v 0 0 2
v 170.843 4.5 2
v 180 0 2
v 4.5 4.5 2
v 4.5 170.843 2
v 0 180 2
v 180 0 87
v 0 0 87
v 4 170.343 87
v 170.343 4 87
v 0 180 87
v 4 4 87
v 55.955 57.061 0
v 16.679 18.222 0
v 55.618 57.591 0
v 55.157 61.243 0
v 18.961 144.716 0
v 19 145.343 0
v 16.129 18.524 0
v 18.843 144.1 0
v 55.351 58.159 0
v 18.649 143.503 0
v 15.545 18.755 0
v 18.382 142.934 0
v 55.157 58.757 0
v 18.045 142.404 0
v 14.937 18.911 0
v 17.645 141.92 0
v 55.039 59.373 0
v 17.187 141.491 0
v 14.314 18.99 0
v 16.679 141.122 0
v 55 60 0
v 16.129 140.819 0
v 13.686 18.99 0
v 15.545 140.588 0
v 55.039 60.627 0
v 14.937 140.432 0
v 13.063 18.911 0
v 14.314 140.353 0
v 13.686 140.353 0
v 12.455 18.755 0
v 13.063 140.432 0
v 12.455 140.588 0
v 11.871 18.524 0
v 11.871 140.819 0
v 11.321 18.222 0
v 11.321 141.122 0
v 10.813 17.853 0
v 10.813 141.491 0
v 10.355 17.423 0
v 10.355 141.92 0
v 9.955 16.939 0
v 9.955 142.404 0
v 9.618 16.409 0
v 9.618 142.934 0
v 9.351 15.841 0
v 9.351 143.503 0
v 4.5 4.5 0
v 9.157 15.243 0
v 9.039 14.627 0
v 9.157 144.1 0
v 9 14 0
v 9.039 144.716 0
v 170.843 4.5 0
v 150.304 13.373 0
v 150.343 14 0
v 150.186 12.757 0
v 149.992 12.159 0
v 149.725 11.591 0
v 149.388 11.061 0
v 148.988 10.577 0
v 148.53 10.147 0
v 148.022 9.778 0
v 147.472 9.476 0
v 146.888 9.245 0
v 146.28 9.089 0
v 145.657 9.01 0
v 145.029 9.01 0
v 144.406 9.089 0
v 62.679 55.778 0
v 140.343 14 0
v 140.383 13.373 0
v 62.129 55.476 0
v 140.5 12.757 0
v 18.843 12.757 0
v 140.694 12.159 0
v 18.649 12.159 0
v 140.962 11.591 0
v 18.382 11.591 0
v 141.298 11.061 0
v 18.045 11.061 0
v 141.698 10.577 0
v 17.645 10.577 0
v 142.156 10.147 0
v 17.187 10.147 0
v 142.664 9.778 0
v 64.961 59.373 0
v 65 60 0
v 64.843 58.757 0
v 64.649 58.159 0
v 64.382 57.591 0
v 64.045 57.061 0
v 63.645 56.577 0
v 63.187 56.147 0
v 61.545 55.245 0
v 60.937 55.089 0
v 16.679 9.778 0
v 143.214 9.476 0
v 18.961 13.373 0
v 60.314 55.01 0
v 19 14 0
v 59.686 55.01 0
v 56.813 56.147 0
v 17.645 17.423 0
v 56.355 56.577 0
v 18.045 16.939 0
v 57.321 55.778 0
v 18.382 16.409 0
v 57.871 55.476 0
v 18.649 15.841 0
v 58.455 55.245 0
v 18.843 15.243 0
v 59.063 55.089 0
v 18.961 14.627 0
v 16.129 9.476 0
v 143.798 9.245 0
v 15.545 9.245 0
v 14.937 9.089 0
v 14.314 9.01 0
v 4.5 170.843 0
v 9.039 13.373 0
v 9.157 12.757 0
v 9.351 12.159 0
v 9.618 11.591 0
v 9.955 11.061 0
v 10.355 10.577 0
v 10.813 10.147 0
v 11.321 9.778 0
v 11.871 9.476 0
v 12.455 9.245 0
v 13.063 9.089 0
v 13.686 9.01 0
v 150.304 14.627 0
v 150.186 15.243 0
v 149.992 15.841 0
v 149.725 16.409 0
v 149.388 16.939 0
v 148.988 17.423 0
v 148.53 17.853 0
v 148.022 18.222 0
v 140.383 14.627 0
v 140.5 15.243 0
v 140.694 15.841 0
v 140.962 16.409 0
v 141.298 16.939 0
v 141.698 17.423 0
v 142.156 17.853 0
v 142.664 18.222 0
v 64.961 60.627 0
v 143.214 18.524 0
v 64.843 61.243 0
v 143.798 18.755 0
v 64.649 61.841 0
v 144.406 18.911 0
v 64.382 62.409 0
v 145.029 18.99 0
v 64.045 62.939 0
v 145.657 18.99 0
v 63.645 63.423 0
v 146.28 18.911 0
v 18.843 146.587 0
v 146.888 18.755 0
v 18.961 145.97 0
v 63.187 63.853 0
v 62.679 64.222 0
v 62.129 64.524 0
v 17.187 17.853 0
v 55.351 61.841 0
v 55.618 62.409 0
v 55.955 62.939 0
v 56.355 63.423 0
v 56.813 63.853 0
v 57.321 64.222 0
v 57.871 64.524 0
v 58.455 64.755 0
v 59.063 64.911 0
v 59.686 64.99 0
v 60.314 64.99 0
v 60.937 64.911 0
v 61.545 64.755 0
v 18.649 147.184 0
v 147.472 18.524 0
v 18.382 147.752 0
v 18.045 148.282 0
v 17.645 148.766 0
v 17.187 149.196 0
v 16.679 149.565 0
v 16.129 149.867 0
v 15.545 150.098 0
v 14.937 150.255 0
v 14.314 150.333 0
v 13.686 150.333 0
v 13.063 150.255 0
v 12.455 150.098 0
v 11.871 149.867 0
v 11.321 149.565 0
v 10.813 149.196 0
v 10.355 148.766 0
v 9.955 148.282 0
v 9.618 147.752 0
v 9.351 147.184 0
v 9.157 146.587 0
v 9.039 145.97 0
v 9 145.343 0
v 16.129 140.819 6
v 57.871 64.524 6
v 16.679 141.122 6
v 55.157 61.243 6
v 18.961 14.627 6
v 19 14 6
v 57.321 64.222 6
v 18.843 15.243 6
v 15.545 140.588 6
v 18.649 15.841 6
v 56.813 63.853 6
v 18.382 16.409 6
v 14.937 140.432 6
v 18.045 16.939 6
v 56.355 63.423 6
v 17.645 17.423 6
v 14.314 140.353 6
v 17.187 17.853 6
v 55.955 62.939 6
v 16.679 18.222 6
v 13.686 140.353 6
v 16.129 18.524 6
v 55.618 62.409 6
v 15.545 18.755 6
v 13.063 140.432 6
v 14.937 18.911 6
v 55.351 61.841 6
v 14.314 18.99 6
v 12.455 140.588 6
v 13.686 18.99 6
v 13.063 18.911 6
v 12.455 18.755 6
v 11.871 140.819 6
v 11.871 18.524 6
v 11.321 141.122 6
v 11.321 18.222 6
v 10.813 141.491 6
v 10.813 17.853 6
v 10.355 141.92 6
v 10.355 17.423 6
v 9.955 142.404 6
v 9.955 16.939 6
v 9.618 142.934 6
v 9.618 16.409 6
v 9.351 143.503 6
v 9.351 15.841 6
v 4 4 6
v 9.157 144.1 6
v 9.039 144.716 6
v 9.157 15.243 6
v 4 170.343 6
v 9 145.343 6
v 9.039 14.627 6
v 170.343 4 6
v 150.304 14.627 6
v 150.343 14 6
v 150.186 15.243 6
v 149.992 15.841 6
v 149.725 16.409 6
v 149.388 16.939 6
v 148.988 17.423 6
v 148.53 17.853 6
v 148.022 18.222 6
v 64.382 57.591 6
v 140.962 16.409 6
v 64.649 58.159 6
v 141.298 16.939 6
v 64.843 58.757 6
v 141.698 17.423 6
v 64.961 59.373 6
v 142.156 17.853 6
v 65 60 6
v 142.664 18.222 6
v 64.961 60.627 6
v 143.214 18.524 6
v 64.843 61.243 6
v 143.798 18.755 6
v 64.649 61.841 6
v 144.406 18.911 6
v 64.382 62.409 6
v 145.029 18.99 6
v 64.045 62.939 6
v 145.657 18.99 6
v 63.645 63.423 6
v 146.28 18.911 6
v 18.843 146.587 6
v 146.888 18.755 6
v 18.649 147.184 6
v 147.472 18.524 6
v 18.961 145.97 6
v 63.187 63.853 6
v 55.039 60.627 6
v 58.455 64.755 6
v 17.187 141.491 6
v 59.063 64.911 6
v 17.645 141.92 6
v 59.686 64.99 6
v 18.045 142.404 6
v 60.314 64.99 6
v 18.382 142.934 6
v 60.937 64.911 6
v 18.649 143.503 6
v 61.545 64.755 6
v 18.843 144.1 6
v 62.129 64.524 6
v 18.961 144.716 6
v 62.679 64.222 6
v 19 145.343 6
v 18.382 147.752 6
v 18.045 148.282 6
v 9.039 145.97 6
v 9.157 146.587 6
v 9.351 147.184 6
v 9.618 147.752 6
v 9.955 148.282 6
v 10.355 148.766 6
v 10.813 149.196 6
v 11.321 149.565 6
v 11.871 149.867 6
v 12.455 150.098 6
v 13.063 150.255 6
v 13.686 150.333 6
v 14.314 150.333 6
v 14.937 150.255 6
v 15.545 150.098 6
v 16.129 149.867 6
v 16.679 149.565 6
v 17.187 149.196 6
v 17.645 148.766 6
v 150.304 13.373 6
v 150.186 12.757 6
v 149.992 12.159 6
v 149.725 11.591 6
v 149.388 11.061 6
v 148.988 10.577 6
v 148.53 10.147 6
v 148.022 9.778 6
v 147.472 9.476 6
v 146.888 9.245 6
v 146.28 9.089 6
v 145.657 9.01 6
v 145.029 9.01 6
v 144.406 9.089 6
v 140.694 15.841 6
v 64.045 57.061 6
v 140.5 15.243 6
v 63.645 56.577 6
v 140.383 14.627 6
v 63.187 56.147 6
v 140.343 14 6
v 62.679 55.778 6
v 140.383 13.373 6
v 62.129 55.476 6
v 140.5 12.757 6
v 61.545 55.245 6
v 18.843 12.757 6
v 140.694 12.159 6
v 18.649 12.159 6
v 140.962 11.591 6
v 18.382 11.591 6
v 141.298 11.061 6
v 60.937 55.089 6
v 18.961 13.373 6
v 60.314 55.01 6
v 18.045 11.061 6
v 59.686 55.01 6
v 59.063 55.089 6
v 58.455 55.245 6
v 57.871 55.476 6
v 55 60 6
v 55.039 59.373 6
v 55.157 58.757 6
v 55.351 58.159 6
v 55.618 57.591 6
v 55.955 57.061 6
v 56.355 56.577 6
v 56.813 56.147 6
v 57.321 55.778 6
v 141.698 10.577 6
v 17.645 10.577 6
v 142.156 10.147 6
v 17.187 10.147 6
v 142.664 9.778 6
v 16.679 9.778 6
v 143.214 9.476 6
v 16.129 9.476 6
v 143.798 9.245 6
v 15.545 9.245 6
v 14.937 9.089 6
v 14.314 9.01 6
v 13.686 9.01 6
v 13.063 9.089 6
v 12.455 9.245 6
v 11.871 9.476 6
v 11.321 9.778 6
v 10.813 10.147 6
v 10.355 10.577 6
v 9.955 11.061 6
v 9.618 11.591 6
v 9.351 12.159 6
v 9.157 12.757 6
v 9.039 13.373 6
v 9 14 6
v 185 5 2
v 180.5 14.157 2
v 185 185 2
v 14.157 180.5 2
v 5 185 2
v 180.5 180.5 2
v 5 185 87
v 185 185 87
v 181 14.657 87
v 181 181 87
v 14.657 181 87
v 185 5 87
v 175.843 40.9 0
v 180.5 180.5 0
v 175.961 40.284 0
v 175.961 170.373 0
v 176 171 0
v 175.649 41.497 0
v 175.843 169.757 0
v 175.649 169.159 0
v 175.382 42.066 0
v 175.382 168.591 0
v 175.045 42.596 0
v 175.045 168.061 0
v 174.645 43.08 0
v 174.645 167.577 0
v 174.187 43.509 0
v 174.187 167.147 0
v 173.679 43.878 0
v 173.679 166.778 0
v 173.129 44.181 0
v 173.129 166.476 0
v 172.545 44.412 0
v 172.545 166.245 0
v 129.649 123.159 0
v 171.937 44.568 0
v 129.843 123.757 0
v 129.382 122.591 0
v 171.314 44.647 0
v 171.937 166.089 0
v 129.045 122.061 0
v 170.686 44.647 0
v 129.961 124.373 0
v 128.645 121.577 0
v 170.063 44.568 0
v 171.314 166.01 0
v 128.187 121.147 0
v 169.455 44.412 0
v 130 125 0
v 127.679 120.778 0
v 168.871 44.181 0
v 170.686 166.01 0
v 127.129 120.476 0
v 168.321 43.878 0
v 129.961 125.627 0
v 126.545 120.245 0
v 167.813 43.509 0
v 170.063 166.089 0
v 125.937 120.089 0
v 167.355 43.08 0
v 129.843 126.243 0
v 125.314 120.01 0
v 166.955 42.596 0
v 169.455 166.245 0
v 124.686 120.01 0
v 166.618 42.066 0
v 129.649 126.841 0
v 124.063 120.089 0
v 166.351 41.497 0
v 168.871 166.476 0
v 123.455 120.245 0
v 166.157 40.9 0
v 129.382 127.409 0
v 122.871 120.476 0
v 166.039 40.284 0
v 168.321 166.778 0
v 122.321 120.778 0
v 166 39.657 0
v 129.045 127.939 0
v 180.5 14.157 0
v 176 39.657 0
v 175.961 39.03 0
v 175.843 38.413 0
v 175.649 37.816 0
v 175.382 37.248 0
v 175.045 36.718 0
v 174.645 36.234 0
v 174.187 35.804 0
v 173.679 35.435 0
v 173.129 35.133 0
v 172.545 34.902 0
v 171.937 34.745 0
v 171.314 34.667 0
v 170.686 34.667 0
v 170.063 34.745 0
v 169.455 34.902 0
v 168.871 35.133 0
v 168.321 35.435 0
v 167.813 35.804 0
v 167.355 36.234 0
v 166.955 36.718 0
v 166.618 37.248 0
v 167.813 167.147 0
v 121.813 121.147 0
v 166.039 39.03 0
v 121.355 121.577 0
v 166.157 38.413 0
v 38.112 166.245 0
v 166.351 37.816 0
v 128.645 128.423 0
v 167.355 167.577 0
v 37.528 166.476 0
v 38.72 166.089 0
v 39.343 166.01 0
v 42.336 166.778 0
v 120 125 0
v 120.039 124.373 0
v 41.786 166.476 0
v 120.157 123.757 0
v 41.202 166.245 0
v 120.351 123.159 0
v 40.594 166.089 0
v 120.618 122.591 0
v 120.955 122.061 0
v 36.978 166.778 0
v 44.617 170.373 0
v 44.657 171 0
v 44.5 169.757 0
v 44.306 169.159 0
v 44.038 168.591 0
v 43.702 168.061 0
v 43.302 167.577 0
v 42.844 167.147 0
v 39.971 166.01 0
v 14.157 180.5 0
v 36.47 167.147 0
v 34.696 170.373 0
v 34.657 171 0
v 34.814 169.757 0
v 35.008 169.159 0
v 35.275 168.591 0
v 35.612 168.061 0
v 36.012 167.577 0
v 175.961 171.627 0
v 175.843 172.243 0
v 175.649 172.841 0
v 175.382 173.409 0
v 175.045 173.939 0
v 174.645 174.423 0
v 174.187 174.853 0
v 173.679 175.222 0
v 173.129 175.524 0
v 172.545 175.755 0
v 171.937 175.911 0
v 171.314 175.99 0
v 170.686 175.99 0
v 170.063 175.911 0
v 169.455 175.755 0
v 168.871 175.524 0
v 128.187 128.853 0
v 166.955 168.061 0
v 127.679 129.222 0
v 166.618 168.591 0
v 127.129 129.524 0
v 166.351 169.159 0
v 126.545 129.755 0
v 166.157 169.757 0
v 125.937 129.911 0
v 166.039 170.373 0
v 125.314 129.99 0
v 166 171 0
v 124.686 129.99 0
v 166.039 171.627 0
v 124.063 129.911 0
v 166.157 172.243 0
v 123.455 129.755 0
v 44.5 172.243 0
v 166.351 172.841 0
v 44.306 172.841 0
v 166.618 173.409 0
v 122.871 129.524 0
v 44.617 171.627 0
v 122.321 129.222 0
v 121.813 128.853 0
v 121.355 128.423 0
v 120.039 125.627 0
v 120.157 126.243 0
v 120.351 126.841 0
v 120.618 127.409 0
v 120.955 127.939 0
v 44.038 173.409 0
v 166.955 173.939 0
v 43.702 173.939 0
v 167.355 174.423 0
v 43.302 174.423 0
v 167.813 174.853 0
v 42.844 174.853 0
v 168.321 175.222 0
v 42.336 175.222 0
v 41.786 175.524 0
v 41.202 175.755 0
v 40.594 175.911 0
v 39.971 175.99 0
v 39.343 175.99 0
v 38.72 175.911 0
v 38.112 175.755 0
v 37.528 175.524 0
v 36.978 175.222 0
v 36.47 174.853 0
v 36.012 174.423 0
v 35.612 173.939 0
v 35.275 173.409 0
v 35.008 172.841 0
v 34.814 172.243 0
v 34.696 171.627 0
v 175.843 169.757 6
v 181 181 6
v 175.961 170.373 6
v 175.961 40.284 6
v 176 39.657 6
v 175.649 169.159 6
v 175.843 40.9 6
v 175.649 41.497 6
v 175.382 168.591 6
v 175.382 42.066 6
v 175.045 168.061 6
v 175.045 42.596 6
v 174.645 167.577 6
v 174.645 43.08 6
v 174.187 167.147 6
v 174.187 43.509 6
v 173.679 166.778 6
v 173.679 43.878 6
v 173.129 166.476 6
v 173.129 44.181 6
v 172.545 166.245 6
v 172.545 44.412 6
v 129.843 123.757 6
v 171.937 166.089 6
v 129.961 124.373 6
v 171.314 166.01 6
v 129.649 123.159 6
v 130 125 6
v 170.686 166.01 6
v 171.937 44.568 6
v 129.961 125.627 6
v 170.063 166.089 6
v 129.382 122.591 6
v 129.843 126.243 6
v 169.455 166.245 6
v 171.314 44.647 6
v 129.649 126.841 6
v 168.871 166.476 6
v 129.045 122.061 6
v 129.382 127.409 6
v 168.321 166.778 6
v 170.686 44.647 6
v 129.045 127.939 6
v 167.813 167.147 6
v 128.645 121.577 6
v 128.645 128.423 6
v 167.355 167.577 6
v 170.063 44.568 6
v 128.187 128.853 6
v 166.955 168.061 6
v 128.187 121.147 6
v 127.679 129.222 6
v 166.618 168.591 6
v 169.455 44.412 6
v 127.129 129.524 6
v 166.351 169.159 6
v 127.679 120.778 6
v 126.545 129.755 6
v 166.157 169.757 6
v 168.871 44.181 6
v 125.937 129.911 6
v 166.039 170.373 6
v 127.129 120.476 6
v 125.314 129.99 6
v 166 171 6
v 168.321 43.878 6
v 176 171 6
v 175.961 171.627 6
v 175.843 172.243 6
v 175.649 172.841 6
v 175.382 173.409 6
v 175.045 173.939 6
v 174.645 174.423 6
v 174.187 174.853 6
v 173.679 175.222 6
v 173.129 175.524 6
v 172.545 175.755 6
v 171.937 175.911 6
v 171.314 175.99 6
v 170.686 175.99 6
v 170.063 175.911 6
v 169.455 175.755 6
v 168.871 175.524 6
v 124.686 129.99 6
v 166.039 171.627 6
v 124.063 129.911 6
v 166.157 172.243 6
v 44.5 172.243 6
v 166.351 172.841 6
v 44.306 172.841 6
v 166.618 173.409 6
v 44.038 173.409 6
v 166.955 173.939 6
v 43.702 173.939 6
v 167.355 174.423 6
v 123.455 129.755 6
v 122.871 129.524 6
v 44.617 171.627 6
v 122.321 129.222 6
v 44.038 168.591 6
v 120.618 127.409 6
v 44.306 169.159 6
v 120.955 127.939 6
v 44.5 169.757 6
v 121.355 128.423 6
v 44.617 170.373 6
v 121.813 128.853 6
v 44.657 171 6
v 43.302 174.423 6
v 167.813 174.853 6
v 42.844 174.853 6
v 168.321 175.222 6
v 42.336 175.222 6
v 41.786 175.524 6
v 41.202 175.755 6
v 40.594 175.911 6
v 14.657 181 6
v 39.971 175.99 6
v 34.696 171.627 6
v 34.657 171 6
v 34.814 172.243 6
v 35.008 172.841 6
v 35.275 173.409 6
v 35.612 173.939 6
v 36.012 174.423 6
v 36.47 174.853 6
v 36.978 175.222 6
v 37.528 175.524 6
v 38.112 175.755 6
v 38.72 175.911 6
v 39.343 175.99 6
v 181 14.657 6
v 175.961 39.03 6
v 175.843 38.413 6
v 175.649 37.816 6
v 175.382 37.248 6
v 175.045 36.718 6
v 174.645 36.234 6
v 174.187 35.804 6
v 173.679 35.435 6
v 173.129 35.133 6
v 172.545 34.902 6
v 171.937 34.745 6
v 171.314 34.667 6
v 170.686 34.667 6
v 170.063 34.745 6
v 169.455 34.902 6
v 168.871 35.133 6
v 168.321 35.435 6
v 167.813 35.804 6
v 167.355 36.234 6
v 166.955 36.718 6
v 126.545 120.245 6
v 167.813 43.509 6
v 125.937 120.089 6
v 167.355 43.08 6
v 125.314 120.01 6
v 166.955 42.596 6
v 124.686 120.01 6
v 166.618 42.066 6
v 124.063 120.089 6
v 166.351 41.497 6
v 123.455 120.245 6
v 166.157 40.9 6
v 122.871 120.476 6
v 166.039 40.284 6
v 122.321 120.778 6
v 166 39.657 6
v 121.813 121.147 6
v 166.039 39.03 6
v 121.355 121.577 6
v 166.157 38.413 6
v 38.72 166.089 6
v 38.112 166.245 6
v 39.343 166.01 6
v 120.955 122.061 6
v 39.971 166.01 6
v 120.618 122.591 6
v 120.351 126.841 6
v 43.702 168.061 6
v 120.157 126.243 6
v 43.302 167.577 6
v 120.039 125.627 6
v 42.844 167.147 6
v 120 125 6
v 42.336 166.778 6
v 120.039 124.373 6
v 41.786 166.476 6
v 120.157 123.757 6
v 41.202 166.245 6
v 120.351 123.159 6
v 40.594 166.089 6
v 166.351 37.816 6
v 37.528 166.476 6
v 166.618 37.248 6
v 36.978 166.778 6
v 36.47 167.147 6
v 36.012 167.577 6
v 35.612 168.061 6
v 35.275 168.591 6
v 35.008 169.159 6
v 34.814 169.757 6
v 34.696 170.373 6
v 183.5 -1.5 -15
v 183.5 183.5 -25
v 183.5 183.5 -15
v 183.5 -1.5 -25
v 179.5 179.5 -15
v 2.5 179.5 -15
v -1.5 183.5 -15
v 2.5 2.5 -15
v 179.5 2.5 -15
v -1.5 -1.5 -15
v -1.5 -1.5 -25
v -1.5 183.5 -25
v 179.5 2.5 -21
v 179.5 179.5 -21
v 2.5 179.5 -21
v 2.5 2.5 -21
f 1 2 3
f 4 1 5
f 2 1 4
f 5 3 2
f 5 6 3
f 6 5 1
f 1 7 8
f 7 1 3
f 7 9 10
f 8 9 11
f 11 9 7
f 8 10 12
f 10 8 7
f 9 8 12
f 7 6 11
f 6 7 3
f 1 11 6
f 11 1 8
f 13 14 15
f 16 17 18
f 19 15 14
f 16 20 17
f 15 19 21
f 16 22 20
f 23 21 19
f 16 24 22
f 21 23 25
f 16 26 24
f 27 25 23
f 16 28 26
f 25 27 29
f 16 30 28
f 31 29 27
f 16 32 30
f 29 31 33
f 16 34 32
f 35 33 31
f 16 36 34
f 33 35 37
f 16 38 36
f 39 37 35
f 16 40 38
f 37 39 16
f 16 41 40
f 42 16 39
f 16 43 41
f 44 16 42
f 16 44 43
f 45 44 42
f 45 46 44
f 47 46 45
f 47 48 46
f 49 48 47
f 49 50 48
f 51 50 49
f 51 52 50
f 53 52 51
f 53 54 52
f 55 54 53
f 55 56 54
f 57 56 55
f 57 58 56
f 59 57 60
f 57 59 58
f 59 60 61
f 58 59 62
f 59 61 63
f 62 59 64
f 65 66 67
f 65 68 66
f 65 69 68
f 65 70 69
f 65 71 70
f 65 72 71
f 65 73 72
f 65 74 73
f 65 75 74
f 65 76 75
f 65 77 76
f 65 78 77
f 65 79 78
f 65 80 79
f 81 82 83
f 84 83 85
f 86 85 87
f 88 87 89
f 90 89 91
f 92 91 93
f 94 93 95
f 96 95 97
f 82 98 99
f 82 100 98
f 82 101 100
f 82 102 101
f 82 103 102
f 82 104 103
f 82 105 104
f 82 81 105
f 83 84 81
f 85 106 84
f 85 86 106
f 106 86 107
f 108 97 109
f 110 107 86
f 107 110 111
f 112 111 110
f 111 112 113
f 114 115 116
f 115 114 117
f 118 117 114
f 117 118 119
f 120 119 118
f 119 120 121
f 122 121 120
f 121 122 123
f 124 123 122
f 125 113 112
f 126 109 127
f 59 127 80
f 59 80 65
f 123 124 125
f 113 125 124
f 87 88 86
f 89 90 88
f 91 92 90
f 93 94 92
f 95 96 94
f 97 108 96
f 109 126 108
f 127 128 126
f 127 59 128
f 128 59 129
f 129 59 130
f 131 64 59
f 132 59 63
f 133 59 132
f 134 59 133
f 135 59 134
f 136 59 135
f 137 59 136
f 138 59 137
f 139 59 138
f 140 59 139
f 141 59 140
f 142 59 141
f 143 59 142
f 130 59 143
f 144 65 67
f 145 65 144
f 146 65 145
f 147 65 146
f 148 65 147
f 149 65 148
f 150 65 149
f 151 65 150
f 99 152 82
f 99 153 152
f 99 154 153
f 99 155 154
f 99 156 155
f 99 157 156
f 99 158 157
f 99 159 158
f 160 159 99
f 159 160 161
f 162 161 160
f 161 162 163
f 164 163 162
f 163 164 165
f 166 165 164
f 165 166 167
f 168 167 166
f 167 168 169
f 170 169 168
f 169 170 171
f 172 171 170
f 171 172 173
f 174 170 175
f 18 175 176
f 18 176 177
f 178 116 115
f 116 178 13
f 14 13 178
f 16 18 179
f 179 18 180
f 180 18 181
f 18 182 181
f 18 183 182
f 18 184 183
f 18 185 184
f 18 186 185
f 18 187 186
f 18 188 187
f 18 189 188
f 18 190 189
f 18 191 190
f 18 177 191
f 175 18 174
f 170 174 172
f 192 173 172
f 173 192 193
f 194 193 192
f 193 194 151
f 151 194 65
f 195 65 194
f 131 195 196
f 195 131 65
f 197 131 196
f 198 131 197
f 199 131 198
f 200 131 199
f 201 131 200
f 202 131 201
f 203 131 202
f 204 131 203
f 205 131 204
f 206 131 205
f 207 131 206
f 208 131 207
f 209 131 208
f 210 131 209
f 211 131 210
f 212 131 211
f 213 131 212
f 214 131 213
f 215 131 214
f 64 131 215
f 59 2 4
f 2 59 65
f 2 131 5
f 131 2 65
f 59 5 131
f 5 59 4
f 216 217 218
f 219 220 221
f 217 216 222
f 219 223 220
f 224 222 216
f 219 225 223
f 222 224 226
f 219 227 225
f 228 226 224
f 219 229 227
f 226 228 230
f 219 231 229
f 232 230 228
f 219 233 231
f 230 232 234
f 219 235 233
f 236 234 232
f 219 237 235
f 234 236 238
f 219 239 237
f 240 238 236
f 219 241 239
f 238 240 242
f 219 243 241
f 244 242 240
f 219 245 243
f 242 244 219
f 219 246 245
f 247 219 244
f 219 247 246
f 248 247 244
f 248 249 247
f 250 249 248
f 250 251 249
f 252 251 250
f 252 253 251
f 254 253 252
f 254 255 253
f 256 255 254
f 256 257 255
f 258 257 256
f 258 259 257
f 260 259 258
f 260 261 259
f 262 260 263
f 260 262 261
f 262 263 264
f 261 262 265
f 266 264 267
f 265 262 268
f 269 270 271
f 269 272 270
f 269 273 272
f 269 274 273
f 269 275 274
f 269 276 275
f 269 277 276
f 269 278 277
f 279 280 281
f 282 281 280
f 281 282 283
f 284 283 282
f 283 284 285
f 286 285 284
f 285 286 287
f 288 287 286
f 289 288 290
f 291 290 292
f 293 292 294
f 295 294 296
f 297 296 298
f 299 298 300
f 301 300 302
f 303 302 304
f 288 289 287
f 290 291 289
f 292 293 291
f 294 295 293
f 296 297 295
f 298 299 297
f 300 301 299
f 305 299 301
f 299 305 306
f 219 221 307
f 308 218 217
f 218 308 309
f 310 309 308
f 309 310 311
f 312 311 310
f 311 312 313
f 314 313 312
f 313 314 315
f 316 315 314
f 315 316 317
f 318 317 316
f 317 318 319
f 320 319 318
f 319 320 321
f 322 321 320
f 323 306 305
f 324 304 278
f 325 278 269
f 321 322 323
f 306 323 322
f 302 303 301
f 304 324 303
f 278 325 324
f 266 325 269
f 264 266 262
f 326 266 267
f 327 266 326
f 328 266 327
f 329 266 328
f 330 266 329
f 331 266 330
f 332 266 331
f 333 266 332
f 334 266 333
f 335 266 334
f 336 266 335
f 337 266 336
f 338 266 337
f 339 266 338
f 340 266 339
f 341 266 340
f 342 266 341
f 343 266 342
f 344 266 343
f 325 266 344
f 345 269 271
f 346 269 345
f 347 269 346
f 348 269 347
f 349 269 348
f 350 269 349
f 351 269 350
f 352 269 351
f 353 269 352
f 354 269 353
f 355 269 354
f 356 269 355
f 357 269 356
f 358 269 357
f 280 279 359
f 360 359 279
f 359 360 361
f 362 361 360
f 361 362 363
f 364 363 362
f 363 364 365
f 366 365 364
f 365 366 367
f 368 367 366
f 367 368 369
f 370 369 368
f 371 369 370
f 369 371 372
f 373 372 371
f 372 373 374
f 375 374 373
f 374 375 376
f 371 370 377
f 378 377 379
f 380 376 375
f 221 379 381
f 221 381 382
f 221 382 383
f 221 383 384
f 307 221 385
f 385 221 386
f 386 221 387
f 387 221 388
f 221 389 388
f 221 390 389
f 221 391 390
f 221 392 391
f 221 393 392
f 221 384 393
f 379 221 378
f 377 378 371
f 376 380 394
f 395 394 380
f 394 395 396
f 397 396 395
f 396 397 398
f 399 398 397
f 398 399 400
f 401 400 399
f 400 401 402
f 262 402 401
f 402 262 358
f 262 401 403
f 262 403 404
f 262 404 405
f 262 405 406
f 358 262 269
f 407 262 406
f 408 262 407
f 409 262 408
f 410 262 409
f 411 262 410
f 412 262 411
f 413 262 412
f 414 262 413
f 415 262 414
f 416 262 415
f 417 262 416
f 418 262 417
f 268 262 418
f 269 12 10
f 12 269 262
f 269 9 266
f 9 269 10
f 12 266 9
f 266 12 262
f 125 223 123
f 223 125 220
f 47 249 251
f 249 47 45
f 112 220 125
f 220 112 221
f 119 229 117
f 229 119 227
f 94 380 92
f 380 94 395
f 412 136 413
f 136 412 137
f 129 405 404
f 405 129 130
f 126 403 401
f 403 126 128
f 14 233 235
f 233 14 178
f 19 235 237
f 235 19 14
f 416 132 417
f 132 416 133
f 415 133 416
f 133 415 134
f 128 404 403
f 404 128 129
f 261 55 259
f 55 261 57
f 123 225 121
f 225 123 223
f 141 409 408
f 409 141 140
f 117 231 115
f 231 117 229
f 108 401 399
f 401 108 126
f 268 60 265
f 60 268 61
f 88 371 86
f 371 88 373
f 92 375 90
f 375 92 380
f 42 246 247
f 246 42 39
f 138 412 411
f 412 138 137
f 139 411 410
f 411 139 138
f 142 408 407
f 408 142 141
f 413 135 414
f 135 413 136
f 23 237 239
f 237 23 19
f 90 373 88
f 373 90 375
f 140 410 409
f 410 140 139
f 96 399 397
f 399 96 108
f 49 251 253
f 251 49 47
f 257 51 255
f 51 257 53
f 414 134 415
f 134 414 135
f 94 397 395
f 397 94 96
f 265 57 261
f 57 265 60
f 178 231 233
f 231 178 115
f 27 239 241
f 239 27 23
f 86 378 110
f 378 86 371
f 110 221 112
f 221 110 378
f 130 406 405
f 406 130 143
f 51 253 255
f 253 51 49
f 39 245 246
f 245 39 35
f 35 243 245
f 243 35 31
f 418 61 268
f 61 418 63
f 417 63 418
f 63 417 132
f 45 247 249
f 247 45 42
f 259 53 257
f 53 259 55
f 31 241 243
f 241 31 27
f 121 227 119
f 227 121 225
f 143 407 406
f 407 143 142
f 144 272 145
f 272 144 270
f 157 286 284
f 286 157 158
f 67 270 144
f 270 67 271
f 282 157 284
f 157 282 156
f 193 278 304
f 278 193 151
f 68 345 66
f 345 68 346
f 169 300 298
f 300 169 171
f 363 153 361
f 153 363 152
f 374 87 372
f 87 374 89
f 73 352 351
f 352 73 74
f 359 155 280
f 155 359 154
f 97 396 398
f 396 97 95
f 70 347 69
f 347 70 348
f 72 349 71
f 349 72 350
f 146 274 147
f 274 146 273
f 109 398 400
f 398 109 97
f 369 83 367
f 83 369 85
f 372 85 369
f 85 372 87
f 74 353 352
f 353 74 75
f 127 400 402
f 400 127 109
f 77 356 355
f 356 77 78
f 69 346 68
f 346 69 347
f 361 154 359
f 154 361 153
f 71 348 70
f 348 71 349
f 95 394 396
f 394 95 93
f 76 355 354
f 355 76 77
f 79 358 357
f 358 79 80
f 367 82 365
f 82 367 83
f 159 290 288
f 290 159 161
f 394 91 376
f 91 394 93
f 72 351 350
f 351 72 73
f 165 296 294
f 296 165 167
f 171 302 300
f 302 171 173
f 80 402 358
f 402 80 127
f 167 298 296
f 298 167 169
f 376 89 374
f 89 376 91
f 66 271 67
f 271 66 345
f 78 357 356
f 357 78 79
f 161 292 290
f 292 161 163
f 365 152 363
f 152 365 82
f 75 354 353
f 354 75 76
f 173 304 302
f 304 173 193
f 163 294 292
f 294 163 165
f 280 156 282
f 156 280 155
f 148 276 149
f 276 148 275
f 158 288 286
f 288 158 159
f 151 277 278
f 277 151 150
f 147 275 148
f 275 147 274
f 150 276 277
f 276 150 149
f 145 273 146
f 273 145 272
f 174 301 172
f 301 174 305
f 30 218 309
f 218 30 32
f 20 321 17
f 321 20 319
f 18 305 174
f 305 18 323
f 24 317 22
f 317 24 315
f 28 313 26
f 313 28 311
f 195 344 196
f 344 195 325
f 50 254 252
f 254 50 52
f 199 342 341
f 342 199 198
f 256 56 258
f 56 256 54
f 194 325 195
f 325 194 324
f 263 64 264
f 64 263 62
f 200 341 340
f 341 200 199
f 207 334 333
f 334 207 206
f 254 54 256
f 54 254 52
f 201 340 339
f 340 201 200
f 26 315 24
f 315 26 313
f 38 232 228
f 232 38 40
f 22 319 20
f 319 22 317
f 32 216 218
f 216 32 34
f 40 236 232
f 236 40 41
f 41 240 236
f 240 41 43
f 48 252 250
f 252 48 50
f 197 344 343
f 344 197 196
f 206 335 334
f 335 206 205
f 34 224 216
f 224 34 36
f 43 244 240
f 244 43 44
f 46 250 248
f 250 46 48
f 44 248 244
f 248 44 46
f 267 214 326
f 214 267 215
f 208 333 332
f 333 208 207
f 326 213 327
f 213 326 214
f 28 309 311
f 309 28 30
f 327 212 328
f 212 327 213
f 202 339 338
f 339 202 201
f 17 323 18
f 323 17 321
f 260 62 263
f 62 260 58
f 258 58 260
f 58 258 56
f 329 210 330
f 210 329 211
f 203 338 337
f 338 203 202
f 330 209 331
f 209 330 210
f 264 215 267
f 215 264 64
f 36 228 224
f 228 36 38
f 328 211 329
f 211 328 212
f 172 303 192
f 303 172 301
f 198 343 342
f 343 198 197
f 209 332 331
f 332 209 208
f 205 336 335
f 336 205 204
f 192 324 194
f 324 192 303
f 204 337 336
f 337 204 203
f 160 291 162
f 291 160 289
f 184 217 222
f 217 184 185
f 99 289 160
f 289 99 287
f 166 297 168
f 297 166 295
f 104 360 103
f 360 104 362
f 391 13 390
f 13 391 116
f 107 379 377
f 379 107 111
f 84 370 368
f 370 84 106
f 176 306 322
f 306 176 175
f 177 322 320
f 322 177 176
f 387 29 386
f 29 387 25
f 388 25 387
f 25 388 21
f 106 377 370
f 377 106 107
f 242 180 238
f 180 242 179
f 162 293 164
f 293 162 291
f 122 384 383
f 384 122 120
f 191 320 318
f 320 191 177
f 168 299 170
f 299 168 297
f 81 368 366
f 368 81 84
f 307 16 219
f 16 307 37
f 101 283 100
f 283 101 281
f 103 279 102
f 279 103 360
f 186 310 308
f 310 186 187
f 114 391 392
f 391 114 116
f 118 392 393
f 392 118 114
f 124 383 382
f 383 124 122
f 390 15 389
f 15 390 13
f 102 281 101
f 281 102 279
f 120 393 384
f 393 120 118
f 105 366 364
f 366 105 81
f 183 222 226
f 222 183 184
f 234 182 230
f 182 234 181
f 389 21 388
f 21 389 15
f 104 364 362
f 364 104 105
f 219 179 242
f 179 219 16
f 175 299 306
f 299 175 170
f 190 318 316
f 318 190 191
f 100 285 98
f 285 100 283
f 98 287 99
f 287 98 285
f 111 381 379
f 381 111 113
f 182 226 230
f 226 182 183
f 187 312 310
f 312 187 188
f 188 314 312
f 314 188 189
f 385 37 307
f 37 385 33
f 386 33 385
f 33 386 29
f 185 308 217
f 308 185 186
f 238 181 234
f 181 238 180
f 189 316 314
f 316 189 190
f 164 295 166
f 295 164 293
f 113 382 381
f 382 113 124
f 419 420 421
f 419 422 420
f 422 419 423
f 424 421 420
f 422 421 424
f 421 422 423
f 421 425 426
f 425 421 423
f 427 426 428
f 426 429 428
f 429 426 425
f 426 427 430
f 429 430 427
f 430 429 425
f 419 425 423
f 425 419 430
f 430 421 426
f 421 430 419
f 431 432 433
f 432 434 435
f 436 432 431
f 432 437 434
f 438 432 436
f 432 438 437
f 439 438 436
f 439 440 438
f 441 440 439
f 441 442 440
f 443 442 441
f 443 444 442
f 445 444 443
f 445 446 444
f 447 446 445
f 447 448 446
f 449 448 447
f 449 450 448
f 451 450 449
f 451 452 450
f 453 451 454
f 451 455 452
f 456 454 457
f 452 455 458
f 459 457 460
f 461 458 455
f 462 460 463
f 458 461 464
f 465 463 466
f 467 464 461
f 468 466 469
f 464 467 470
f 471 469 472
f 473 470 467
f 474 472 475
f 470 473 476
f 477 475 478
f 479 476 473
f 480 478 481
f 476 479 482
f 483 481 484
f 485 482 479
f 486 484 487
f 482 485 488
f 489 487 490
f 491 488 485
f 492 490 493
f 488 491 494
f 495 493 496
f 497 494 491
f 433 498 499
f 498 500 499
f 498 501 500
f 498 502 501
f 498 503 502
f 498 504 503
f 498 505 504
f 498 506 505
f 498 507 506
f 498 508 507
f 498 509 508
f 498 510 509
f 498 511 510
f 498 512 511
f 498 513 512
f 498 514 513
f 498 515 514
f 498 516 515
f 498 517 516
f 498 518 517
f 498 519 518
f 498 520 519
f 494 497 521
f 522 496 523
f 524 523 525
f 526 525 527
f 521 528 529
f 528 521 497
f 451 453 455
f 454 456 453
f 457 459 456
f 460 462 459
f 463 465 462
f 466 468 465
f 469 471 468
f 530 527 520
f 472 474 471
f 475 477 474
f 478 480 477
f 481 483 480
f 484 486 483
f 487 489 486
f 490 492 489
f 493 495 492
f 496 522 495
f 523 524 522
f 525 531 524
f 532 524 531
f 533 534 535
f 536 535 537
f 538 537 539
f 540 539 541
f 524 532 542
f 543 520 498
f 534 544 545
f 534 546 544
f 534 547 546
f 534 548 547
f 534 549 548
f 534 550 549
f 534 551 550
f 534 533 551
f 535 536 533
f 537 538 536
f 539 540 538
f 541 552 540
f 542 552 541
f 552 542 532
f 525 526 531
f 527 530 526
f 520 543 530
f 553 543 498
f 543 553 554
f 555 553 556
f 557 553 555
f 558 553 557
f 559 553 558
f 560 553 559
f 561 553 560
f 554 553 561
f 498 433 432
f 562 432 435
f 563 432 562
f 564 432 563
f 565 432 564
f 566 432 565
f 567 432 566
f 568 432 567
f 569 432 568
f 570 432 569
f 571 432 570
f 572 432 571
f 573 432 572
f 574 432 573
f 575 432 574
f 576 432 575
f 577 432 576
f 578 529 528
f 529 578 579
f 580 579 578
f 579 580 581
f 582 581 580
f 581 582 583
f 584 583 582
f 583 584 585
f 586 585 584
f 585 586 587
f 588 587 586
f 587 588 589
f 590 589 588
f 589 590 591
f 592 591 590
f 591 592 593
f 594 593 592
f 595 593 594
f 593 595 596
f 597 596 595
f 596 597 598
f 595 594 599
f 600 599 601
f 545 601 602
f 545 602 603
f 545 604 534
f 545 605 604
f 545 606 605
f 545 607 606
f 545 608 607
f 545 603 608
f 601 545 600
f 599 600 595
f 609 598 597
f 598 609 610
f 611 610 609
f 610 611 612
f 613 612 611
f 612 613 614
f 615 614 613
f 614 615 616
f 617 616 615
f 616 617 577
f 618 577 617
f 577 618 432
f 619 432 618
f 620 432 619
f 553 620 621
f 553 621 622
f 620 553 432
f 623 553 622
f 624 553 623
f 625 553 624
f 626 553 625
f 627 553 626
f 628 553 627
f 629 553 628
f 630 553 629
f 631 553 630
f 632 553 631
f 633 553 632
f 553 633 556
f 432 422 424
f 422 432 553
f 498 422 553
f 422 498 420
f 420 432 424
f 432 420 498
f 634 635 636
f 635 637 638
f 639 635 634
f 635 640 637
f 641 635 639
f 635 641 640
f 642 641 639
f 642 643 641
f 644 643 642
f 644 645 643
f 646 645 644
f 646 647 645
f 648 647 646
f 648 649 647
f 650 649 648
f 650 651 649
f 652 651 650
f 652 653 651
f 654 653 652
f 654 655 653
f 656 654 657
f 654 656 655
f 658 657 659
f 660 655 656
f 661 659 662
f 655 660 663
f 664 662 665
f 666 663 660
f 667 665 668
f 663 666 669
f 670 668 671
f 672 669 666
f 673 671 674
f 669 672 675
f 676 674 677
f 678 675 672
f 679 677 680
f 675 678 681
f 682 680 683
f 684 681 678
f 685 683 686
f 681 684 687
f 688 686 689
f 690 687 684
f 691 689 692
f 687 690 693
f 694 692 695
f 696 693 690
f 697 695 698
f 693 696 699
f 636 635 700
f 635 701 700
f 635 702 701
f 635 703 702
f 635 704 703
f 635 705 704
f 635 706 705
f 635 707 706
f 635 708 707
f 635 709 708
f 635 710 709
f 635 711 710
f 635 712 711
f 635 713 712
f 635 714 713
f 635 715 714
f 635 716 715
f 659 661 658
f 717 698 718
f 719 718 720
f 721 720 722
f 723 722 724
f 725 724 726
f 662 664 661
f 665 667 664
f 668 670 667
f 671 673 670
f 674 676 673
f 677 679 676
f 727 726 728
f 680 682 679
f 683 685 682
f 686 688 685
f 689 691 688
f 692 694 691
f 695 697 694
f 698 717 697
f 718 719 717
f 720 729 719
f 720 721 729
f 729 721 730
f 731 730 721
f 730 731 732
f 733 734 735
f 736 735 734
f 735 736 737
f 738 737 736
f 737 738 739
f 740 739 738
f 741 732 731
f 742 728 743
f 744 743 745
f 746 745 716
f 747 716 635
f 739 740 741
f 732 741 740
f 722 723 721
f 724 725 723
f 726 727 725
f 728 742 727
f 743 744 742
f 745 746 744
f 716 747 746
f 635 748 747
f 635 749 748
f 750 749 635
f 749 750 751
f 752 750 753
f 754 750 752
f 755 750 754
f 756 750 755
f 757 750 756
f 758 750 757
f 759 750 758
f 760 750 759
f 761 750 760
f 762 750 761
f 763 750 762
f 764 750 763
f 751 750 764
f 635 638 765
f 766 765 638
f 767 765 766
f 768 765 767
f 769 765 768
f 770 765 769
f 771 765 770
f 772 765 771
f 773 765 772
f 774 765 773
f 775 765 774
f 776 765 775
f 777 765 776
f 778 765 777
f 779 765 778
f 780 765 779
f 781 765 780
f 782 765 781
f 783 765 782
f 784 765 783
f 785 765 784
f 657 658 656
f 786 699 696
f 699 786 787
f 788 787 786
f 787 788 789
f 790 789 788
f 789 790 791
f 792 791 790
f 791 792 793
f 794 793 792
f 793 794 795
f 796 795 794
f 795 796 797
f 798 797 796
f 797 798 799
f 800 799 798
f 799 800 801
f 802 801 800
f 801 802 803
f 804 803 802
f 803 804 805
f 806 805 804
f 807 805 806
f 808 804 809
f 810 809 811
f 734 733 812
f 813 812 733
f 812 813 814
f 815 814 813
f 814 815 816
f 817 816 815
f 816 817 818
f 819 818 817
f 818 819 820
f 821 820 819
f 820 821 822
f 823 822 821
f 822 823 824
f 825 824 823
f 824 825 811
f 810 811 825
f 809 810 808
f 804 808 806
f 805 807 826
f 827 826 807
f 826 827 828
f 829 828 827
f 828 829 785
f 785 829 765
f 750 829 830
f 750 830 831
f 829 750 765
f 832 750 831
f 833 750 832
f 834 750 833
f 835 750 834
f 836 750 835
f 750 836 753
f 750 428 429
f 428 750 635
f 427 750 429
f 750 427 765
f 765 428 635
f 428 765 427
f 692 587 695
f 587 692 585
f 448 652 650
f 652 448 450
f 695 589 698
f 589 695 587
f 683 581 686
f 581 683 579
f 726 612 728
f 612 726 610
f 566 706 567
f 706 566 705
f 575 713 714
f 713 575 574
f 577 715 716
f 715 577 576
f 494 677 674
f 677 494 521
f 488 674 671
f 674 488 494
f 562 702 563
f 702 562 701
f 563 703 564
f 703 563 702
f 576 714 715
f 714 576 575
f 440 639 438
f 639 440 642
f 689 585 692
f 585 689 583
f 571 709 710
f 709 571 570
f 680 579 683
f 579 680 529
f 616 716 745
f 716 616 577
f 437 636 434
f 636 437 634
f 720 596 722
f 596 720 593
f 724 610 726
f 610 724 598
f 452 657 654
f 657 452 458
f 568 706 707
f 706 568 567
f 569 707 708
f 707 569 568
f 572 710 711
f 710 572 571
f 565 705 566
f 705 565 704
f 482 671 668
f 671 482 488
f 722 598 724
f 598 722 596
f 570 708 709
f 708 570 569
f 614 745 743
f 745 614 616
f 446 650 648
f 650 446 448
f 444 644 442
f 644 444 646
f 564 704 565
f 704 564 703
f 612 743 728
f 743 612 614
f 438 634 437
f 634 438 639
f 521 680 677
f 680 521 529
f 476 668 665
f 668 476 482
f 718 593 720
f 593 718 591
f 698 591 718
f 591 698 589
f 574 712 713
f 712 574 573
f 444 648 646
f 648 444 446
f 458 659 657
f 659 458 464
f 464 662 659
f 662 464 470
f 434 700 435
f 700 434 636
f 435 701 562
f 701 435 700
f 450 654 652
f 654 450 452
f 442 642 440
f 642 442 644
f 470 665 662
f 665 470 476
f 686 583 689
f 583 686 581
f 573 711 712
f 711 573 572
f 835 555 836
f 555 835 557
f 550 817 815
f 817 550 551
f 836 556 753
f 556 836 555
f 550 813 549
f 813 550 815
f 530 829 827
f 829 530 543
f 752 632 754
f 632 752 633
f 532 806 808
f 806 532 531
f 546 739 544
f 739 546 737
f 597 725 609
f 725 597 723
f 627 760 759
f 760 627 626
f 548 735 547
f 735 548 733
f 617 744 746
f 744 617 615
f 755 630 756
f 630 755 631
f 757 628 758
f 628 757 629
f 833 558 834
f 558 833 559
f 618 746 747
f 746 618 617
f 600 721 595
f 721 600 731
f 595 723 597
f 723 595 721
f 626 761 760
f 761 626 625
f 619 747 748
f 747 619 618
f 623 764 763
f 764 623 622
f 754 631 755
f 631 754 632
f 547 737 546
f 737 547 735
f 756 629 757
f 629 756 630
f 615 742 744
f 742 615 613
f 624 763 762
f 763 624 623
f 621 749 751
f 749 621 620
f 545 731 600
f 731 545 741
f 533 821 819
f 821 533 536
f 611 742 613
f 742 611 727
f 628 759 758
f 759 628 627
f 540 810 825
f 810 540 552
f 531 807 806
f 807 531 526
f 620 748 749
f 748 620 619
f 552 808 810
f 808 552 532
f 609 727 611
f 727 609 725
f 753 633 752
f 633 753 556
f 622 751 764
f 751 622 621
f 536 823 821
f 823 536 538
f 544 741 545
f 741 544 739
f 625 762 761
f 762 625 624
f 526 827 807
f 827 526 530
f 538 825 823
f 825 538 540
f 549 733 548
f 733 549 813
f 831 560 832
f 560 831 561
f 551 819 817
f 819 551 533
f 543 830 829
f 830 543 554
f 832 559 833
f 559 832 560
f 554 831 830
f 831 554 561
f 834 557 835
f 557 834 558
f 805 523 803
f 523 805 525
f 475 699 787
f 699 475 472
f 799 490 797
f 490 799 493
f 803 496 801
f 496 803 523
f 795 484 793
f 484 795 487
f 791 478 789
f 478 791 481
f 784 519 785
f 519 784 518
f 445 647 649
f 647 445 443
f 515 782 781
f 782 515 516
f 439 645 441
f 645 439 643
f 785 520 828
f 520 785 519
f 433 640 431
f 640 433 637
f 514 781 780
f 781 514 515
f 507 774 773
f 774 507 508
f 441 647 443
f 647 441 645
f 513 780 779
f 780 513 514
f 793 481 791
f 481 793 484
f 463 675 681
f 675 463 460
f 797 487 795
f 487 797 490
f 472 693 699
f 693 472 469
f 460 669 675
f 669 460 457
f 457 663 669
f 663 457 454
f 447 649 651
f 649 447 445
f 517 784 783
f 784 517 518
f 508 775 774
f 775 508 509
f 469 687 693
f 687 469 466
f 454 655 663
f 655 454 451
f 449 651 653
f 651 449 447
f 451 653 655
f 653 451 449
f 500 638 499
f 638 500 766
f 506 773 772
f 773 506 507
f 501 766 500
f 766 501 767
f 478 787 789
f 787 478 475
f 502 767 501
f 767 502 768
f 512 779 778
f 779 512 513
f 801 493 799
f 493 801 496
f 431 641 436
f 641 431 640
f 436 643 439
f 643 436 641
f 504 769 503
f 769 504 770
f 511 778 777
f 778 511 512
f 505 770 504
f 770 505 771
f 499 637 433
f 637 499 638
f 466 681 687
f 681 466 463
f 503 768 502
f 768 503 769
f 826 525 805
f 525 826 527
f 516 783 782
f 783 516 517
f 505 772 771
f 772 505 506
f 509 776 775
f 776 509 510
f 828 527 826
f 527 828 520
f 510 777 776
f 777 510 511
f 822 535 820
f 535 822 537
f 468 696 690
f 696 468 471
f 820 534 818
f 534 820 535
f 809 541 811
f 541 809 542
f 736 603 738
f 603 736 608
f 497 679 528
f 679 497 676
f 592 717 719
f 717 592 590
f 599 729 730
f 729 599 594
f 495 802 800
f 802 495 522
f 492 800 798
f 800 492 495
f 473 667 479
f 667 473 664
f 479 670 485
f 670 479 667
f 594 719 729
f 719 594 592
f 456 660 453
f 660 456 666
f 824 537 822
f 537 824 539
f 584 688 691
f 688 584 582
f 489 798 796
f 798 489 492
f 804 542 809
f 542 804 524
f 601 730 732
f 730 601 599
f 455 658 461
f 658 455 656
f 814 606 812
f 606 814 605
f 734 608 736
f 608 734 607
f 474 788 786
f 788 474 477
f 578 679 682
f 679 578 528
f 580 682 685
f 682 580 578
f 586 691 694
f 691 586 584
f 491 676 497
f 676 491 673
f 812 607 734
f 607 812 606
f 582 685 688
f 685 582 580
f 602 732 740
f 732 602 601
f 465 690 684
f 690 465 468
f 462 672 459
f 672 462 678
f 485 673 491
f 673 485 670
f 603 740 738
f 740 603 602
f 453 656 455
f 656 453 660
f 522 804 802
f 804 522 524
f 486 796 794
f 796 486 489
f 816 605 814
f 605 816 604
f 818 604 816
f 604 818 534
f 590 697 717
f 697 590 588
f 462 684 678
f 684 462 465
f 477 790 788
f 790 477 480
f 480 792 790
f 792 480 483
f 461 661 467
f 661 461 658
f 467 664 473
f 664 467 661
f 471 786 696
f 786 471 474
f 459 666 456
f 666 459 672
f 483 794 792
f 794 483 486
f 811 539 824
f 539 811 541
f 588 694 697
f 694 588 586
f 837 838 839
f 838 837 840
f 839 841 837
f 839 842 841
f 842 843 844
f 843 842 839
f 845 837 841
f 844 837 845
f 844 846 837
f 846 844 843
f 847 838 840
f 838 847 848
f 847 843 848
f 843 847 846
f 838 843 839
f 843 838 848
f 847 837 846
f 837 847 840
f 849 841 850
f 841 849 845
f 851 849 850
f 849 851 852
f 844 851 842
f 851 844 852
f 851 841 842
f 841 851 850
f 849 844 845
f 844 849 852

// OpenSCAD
// file: 2dshapes.scad
module rightTriangle(xLen, yLen) {
     polygon([[xLen, 0], [0,0], [0, yLen]]);
}
// file: triangle_flower_pot.scad
$fn = 50;

include <2dshapes.scad>

// Thickness of all sides
wallThickness = 4;

// Length of the two legs of the triangle
xLen = 180;
yLen = 180;

// Height of the pot (not including the tray)
height = 85;

// Radius of the drainage holes
holeRadius = 5;

// Height of the lip on the bottom of the pot that keeps the
// tray in place.
trayLip = 2;

// X and Y distance between each half of the pot
sep = 5;

// Tolerance of the tray lip
tol = 0.5;

// Module for drawing one side of the pot
module trianglePot() {
     difference() {

	  // Calculate the dimensions for the inside of the pot.
	  diff = wallThickness +
	       sqrt(2 * wallThickness * wallThickness) +
	       wallThickness;

	  innerXLen = xLen - diff;
	  innerYLen = yLen - diff;
	  
	  union() {
	       linear_extrude(height) rightTriangle(xLen, yLen);

	       // Tray lip
	       translate([wallThickness + tol, wallThickness + tol, -trayLip])
		    linear_extrude(height) rightTriangle(innerXLen, innerYLen);
	  }

	  // Subtract out the inside of the pot
	  translate([wallThickness, wallThickness, wallThickness]) {
	       linear_extrude(height) {
		    rightTriangle(innerXLen , innerYLen);
	       }
	  }

	  // Drainage holes 
	  translate([wallThickness + (2*holeRadius), wallThickness + (2*holeRadius), -height/2]) {
	       linear_extrude(height)
		    circle(holeRadius);
	  }

	  translate([wallThickness + innerXLen - (5 * holeRadius), wallThickness + 2*holeRadius, -height/2]) {
	       linear_extrude(height)
		    circle(holeRadius);
	  }

	  translate([wallThickness + 2*holeRadius, wallThickness + innerYLen - (5 * holeRadius), -height/2]) {
	       linear_extrude(height)
		    circle(holeRadius);
	  }

	  translate([xLen/3, yLen/3, -height/2]) {
	       linear_extrude(height)
		    circle(holeRadius);
	  }
     }
}


// Height of the tray
trayHeight = 10;

// Module for drawing the drip tray.
module dripTray() {
     difference() {
	  cube([xLen + sep, yLen + sep, trayHeight], center = true);
	  translate([0,0,wallThickness]) cube([xLen + sep - (wallThickness * 2), yLen + sep - (wallThickness * 2), trayHeight], center=true);
     }
}
// main file
include <triangle_flower_pot.scad>

/* Render an exploded view illustrating how the pot fits together */

translate([0,0,trayLip]) trianglePot();
translate([xLen + sep, yLen + sep, trayLip]) rotate([0,0,180]) trianglePot();

translate([(xLen+2)/2, (yLen+2)/2, -trayHeight * 2]){
     dripTray();
}
